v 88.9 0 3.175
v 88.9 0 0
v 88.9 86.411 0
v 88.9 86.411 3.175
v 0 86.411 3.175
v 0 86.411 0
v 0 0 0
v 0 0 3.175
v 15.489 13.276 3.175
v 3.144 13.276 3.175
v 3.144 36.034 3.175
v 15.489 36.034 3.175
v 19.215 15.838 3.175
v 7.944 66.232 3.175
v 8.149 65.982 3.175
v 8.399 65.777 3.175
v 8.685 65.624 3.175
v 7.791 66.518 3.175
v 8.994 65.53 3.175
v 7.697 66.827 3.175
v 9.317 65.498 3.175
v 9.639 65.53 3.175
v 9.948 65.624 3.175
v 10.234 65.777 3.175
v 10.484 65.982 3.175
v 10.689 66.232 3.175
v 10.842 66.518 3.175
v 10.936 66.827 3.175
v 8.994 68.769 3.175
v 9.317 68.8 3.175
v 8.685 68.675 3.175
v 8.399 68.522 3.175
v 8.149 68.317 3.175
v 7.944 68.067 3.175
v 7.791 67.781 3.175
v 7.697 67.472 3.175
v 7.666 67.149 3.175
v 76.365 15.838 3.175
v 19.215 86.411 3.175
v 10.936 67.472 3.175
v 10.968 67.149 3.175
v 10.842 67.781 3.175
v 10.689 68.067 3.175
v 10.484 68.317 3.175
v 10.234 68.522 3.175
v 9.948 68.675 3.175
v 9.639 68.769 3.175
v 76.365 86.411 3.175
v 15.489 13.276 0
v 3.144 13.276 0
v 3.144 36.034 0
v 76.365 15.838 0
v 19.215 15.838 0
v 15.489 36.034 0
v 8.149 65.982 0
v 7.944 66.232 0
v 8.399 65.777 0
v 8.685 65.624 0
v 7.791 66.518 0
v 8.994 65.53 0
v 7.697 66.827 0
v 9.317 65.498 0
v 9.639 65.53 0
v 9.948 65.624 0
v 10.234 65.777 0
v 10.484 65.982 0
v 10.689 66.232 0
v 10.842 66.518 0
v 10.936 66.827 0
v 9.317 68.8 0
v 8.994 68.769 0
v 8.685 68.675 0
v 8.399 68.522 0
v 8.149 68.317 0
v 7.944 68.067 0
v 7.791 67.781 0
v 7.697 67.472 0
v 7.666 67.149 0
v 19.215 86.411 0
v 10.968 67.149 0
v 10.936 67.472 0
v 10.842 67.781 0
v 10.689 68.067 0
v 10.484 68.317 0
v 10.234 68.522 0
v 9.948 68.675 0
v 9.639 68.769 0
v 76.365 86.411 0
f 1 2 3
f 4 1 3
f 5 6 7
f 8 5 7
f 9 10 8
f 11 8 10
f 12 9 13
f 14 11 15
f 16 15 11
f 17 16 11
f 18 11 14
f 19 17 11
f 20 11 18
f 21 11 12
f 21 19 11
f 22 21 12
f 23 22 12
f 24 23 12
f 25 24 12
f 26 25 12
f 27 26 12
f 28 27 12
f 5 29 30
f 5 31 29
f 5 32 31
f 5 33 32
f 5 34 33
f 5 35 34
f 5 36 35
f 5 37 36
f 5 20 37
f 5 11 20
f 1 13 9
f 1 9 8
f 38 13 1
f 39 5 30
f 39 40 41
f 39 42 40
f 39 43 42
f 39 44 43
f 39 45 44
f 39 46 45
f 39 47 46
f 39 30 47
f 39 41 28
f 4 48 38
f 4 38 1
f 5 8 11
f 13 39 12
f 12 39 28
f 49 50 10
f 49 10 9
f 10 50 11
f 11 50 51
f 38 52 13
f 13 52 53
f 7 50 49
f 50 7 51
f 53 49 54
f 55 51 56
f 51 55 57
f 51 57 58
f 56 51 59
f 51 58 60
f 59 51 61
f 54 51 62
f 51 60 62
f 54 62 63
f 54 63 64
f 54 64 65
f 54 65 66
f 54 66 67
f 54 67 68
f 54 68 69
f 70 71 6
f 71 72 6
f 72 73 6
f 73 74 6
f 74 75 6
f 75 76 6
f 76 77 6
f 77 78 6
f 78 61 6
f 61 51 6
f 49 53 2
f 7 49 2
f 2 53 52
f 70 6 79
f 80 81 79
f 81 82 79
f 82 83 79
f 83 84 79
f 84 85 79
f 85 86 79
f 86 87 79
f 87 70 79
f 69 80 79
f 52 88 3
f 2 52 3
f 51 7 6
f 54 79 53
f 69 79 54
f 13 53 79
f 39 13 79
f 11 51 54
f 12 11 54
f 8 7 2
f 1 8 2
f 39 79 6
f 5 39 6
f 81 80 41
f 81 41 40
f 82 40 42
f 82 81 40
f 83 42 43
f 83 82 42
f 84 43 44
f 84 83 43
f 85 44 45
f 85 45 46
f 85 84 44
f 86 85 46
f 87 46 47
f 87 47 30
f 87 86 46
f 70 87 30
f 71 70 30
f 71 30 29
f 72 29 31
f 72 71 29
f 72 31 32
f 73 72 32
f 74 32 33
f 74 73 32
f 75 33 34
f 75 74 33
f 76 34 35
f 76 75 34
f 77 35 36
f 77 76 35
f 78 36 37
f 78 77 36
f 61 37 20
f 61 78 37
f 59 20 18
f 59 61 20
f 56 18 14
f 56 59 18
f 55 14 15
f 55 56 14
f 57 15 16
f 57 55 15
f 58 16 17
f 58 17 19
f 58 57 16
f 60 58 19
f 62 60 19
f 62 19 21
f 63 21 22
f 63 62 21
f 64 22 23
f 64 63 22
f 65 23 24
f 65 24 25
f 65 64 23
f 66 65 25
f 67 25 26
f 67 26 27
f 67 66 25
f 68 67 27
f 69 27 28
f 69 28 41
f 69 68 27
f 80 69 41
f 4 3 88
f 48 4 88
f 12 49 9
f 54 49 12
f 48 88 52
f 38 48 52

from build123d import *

# Parameters (mm, degrees)
F0_W     = 12.3444
F0_H     = 22.7584
F0_R     = 1.651
F1_DEPTH = 3.175


# Not quite as in the source:
# - a length typed as a fraction of an inch, garbled in the dataset ("3 / 203.2 mm" for 3/8 in), is restored


with BuildPart() as f1:
    # F0 (on Top) → F1 (new body)
    with BuildSketch(Plane.XY):
        Polygon((0, 86.4107935882), (0, 0), (19.2153378795, 0), (88.9, 0), (88.9, 15.8380966835), (88.9, 86.4107935882), (76.3653378795, 86.4107935882), (76.3653378795, 15.8380966835), (19.2153378795, 15.8380966835), (19.2153378795, 86.4107935882), align=None)
        with Locations((9.3165273066, 24.6552514774)):
            Rectangle(F0_W, F0_H, mode=Mode.SUBTRACT)
        with Locations((9.3165273066, 67.1494514774)):
            Circle(F0_R, mode=Mode.SUBTRACT)
    extrude(amount=F1_DEPTH)


solid = f1.part
